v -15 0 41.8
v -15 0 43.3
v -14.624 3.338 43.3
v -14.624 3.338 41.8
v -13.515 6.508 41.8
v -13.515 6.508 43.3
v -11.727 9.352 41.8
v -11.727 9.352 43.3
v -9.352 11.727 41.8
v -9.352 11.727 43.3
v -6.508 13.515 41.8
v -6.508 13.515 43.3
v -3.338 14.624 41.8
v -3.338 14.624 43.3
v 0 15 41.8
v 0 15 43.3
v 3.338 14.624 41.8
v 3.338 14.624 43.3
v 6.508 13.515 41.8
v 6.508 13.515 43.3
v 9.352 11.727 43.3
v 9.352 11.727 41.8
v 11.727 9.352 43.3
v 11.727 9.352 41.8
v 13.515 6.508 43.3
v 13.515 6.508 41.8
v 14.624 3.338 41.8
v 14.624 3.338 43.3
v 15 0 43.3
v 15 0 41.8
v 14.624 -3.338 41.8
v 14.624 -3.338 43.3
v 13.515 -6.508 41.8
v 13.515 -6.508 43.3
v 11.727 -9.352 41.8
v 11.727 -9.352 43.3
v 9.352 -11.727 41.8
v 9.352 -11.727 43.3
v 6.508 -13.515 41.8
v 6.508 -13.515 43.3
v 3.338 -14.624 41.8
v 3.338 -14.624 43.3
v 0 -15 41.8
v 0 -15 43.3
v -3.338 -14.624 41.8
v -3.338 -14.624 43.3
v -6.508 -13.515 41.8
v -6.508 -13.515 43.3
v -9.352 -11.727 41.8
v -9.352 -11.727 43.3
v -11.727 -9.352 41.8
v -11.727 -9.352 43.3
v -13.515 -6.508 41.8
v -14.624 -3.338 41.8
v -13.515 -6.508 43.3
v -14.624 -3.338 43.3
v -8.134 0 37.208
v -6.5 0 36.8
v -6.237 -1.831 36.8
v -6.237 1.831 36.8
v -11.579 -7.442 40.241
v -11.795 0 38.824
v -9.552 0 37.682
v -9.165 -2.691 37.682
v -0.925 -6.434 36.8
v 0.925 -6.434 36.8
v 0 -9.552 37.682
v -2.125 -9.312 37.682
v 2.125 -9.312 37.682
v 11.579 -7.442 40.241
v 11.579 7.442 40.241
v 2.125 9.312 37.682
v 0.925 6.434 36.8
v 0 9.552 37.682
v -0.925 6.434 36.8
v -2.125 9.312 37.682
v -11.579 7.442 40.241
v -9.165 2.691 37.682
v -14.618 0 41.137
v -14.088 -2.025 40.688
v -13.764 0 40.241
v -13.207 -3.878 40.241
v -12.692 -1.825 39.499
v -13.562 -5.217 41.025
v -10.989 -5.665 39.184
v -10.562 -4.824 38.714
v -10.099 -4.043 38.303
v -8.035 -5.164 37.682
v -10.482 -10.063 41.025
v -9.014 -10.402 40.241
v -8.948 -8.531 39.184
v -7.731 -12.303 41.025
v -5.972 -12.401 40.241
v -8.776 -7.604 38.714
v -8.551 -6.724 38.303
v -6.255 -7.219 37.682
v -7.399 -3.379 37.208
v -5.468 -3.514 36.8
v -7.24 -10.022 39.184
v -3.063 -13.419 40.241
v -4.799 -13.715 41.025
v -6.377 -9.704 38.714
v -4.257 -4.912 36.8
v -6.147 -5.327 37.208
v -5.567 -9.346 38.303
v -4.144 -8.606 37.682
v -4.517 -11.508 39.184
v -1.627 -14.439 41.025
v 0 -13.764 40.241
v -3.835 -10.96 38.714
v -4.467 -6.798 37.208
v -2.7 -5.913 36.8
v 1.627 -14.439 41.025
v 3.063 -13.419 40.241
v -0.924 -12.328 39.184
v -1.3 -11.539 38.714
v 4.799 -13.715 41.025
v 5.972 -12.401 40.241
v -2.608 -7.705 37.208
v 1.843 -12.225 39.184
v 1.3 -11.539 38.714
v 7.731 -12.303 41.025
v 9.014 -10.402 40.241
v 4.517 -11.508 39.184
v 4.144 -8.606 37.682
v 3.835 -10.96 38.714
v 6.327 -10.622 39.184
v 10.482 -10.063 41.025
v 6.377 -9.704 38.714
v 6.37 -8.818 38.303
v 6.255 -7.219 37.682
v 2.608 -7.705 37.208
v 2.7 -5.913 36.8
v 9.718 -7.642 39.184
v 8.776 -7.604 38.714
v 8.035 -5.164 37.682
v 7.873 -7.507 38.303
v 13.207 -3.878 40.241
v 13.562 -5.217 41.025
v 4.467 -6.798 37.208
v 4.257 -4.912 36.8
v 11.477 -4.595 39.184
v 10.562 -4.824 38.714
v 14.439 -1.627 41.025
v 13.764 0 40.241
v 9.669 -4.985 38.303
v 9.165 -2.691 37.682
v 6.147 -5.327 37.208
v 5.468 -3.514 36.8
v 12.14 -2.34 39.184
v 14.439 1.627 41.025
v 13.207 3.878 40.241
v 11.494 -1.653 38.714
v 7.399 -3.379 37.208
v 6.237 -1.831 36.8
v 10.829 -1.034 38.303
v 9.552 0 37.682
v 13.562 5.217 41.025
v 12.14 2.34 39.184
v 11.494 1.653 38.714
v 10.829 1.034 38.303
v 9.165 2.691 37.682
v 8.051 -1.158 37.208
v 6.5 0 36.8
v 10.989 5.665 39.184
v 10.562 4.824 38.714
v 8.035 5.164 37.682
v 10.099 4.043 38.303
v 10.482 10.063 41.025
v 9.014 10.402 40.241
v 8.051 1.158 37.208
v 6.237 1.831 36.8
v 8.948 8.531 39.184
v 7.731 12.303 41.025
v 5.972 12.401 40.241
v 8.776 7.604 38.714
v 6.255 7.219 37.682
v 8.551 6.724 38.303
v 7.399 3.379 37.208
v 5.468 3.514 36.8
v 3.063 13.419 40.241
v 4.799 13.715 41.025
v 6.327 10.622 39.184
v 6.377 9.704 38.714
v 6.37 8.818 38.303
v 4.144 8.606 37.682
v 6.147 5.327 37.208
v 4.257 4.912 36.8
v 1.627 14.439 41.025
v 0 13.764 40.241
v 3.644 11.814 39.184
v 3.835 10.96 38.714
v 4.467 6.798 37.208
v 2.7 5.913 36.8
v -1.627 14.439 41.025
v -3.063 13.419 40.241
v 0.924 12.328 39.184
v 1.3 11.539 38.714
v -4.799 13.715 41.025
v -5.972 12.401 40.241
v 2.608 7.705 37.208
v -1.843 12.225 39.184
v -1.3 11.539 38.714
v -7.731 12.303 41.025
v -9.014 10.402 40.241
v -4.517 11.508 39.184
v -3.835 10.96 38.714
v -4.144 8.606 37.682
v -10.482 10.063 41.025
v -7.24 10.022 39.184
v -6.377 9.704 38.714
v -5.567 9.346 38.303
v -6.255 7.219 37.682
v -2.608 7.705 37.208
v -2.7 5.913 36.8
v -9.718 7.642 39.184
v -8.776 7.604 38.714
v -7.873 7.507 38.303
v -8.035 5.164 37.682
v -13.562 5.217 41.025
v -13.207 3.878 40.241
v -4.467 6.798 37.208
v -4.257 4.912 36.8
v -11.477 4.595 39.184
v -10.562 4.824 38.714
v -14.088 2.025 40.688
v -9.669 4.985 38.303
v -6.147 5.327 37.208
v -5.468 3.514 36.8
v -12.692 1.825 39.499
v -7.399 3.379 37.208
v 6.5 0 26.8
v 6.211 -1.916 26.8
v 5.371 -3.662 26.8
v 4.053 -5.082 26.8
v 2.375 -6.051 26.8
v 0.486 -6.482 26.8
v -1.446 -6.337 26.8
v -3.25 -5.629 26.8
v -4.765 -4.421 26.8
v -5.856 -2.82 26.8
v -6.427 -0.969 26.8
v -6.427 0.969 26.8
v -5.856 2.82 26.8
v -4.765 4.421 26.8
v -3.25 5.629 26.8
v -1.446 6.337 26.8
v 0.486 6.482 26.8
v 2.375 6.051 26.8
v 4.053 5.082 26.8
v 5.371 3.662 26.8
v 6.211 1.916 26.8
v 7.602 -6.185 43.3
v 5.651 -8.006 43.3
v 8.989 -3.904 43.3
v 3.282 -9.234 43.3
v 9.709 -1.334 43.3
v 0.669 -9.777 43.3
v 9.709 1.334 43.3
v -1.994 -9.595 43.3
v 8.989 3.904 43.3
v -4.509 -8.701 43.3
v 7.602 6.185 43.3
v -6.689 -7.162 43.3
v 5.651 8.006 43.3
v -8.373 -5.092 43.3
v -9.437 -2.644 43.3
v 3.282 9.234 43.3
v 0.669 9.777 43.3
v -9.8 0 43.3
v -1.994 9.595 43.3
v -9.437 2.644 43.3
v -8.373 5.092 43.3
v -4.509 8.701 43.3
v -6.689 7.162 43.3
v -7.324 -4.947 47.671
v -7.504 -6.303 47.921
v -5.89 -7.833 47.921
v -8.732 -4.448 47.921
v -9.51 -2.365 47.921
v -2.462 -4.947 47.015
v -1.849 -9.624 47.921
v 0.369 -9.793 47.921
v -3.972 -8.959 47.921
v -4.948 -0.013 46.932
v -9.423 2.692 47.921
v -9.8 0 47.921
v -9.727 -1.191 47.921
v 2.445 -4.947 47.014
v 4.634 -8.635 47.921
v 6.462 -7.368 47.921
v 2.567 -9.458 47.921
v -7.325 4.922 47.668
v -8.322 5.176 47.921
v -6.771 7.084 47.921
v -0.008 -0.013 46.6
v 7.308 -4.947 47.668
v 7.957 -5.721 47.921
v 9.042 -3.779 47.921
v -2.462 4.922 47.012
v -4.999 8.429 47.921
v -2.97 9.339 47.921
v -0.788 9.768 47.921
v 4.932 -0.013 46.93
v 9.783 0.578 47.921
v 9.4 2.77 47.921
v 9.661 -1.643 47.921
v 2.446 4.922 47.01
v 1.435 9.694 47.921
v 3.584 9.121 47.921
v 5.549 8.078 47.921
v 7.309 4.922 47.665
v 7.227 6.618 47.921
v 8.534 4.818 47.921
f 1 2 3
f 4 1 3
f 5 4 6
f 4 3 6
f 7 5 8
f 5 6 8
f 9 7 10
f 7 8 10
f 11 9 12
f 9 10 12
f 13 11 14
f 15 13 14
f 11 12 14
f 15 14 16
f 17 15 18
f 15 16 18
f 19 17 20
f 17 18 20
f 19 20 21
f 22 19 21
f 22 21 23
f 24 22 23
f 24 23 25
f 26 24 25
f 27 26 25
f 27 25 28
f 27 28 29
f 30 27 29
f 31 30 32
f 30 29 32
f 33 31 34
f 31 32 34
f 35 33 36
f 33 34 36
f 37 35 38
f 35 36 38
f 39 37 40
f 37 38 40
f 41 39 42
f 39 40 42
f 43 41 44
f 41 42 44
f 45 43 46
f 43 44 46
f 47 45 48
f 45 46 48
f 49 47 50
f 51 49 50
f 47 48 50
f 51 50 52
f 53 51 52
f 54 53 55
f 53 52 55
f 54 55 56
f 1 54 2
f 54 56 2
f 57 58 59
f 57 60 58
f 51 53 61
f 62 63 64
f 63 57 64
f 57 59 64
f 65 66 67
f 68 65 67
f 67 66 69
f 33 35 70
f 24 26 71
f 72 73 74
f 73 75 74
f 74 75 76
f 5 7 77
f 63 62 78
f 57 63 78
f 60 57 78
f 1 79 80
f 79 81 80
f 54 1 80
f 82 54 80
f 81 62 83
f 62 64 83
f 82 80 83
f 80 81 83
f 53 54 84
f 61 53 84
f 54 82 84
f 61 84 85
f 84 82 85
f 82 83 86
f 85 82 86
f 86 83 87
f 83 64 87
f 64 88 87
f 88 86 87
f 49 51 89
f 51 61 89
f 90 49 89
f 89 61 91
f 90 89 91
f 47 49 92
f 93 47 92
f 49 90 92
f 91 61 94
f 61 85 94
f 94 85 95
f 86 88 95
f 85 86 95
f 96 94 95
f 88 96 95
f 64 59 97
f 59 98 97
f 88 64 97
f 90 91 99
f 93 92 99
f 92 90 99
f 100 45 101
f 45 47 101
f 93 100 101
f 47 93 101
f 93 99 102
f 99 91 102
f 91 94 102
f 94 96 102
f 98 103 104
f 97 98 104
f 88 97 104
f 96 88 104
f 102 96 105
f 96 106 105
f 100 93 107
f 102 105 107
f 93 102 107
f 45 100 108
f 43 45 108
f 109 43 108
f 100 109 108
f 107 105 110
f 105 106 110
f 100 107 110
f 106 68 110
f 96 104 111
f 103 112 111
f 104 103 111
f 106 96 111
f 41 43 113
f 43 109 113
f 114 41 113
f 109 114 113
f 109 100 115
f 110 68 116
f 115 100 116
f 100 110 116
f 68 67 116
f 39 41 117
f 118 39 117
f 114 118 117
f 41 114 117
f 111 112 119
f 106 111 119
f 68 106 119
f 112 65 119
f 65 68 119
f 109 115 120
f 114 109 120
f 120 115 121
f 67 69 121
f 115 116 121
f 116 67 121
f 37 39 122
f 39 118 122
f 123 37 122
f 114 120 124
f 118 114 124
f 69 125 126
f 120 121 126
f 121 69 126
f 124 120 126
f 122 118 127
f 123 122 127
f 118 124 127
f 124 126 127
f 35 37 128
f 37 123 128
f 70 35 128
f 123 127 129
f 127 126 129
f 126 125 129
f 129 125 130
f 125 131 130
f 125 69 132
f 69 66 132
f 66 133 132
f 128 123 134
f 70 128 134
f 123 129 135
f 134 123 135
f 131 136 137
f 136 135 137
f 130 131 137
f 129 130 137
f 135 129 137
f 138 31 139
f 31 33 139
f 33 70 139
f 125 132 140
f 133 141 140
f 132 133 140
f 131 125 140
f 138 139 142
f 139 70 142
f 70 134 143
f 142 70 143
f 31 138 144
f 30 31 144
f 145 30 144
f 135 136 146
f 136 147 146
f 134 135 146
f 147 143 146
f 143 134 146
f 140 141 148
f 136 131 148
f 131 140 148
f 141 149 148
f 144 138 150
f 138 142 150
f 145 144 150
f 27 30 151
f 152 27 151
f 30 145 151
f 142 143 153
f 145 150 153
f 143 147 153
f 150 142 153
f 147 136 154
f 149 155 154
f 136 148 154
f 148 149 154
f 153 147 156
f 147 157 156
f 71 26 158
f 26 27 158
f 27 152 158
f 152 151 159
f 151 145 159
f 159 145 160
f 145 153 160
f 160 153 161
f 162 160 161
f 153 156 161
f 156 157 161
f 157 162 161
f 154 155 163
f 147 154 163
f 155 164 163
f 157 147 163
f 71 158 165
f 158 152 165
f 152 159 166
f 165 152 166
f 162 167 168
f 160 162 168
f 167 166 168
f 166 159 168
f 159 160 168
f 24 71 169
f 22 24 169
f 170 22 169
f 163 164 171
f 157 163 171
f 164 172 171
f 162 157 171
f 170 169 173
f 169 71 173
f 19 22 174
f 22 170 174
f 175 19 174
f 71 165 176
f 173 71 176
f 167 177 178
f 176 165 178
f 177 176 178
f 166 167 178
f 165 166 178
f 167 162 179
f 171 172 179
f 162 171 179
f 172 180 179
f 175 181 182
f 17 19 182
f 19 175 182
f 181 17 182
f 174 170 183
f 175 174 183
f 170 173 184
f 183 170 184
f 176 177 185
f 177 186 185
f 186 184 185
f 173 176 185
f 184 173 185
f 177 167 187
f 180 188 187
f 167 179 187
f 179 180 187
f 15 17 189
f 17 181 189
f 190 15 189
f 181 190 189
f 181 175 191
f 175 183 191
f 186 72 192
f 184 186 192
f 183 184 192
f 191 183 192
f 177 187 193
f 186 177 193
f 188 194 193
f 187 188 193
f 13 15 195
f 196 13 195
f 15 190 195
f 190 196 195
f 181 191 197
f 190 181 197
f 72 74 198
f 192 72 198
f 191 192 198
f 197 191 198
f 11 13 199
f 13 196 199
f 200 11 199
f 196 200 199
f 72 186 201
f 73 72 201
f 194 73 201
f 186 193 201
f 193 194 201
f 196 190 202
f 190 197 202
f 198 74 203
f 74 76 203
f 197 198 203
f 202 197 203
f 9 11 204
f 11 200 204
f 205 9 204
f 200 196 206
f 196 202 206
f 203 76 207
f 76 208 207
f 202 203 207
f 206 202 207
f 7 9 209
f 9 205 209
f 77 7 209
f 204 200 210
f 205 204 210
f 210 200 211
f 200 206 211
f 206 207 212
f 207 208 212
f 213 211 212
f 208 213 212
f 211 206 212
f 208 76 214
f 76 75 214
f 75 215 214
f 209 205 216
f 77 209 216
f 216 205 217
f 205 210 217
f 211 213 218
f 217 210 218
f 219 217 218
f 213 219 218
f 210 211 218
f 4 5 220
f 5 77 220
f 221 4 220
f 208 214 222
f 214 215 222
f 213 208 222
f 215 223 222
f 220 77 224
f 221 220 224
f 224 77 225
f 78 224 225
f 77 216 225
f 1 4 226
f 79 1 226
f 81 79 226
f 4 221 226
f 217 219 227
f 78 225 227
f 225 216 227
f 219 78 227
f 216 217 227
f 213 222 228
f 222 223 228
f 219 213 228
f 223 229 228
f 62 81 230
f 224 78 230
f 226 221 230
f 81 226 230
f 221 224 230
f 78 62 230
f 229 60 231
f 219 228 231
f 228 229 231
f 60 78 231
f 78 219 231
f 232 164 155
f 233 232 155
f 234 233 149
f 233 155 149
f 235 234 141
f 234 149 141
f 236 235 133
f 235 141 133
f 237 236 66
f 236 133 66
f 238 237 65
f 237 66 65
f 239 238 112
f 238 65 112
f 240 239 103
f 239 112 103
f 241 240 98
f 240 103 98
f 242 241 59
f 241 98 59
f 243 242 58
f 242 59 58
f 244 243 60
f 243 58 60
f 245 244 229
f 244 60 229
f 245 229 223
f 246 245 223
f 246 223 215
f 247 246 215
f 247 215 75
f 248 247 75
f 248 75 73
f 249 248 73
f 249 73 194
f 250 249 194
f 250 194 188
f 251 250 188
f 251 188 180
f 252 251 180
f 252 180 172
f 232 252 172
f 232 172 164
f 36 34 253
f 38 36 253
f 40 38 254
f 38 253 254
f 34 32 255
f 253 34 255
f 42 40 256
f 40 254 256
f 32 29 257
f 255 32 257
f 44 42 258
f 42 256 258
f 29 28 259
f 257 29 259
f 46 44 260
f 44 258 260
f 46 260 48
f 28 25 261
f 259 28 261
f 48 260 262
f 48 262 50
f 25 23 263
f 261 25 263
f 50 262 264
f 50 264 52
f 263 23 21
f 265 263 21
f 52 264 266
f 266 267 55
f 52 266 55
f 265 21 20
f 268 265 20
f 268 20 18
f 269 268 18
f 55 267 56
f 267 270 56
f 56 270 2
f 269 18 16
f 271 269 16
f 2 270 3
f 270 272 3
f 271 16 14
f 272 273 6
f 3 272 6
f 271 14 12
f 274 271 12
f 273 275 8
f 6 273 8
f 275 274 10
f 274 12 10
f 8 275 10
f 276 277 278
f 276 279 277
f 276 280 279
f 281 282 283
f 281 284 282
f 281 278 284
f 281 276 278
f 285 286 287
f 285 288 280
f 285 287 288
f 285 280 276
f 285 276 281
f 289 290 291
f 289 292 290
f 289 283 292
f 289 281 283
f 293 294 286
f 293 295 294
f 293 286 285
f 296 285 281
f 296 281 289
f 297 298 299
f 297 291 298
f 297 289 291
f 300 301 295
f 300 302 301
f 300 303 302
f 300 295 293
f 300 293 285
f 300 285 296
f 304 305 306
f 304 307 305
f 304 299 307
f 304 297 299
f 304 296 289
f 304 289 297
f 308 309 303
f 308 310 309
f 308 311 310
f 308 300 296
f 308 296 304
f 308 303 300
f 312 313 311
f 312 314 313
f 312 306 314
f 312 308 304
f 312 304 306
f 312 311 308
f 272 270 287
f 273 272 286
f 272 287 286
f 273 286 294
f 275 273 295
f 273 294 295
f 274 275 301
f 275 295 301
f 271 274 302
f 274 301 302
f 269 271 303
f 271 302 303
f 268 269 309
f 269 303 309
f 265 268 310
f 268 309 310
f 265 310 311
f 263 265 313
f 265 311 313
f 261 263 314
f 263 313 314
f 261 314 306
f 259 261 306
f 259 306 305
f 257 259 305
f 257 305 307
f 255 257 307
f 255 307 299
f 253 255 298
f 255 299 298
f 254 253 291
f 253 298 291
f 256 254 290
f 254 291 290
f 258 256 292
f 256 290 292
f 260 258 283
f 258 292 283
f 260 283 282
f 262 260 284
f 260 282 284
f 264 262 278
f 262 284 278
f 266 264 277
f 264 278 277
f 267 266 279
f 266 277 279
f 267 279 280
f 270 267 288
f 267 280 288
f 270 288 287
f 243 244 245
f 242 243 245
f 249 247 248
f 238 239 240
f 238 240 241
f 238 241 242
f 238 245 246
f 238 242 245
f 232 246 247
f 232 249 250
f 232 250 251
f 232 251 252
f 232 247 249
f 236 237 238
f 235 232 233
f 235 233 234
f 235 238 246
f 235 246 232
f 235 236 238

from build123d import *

# Parameters (mm, degrees)
F3_R          = 9.8
F4_DEPTH      = 10
F4_DEPTH_BACK = 0.3
F6_R          = 15
F6_R_2        = 9.8
F7_DEPTH      = 1.5
F9_ANGLE      = 180
F10_R         = 6.5
F11_DEPTH     = 15


# Not quite as in the source:
# - a feature names something its author has since deleted; it is built from what else it names


with BuildPart() as f1:
    # F0 (on Top) → F1 (revolve)
    with BuildSketch(Plane.XY):
        with BuildLine():
            Line((0, 37), (0, -37))
            ThreePointArc((0, -37), (37, 0), (0, 37))
        make_face()
    revolve(axis=Axis((0, 0, 0), (0, -1, 0)))


with BuildPart() as f4:
    # F3 (on offset) → F4 (new body, two sides)
    with BuildSketch(Plane.XY.offset(40)) as f4_sk:
        Circle(F3_R)
    extrude(amount=-F4_DEPTH)
    extrude(f4_sk.sketch, amount=F4_DEPTH_BACK)

    # F5: cut F1
    add(f1.part, mode=Mode.SUBTRACT)

    # F6 (on face) → F7 (join)
    with BuildSketch(Plane.XY.offset(40.3)):
        Circle(F6_R)
        Circle(F6_R_2, mode=Mode.SUBTRACT)
        Circle(F6_R_2)
    extrude(amount=F7_DEPTH)


with BuildPart() as f4_1:
    # F9: moved
    add(f4.part.rotate(Axis((0, 0, 41.8), (0, 1, 0)), F9_ANGLE))

    # F10 (on face) → F11 (join)
    with BuildSketch(Plane(origin=(0, 0, 41.8), x_dir=(1, 0, 0), z_dir=(0, 0, -1))):
        Circle(F10_R)
    extrude(amount=F11_DEPTH)

    # F12 (on Front) → F14 (revolve)
    with BuildSketch(Plane.XZ):
        with BuildLine():
            Line((-6.5, 36.8), (-6.5, 41.8))
            Line((-6.5, 41.8), (-15, 41.8))
            add(Edge.make_bspline(
                [(-15, 41.8), (-14.5252337679, 40.5401661992), (-10.4554320312, 37.7730797784), (-8.2265594974, 37.2042804956), (-6.5, 36.8)],
                knots=[0, 0, 0, 0, 0.5265068143, 1, 1, 1, 1], degree=3))
        make_face()
    revolve(axis=Axis((0, 0, 37.5033216551), (0, 0, 1)))


solid = f4_1.part
